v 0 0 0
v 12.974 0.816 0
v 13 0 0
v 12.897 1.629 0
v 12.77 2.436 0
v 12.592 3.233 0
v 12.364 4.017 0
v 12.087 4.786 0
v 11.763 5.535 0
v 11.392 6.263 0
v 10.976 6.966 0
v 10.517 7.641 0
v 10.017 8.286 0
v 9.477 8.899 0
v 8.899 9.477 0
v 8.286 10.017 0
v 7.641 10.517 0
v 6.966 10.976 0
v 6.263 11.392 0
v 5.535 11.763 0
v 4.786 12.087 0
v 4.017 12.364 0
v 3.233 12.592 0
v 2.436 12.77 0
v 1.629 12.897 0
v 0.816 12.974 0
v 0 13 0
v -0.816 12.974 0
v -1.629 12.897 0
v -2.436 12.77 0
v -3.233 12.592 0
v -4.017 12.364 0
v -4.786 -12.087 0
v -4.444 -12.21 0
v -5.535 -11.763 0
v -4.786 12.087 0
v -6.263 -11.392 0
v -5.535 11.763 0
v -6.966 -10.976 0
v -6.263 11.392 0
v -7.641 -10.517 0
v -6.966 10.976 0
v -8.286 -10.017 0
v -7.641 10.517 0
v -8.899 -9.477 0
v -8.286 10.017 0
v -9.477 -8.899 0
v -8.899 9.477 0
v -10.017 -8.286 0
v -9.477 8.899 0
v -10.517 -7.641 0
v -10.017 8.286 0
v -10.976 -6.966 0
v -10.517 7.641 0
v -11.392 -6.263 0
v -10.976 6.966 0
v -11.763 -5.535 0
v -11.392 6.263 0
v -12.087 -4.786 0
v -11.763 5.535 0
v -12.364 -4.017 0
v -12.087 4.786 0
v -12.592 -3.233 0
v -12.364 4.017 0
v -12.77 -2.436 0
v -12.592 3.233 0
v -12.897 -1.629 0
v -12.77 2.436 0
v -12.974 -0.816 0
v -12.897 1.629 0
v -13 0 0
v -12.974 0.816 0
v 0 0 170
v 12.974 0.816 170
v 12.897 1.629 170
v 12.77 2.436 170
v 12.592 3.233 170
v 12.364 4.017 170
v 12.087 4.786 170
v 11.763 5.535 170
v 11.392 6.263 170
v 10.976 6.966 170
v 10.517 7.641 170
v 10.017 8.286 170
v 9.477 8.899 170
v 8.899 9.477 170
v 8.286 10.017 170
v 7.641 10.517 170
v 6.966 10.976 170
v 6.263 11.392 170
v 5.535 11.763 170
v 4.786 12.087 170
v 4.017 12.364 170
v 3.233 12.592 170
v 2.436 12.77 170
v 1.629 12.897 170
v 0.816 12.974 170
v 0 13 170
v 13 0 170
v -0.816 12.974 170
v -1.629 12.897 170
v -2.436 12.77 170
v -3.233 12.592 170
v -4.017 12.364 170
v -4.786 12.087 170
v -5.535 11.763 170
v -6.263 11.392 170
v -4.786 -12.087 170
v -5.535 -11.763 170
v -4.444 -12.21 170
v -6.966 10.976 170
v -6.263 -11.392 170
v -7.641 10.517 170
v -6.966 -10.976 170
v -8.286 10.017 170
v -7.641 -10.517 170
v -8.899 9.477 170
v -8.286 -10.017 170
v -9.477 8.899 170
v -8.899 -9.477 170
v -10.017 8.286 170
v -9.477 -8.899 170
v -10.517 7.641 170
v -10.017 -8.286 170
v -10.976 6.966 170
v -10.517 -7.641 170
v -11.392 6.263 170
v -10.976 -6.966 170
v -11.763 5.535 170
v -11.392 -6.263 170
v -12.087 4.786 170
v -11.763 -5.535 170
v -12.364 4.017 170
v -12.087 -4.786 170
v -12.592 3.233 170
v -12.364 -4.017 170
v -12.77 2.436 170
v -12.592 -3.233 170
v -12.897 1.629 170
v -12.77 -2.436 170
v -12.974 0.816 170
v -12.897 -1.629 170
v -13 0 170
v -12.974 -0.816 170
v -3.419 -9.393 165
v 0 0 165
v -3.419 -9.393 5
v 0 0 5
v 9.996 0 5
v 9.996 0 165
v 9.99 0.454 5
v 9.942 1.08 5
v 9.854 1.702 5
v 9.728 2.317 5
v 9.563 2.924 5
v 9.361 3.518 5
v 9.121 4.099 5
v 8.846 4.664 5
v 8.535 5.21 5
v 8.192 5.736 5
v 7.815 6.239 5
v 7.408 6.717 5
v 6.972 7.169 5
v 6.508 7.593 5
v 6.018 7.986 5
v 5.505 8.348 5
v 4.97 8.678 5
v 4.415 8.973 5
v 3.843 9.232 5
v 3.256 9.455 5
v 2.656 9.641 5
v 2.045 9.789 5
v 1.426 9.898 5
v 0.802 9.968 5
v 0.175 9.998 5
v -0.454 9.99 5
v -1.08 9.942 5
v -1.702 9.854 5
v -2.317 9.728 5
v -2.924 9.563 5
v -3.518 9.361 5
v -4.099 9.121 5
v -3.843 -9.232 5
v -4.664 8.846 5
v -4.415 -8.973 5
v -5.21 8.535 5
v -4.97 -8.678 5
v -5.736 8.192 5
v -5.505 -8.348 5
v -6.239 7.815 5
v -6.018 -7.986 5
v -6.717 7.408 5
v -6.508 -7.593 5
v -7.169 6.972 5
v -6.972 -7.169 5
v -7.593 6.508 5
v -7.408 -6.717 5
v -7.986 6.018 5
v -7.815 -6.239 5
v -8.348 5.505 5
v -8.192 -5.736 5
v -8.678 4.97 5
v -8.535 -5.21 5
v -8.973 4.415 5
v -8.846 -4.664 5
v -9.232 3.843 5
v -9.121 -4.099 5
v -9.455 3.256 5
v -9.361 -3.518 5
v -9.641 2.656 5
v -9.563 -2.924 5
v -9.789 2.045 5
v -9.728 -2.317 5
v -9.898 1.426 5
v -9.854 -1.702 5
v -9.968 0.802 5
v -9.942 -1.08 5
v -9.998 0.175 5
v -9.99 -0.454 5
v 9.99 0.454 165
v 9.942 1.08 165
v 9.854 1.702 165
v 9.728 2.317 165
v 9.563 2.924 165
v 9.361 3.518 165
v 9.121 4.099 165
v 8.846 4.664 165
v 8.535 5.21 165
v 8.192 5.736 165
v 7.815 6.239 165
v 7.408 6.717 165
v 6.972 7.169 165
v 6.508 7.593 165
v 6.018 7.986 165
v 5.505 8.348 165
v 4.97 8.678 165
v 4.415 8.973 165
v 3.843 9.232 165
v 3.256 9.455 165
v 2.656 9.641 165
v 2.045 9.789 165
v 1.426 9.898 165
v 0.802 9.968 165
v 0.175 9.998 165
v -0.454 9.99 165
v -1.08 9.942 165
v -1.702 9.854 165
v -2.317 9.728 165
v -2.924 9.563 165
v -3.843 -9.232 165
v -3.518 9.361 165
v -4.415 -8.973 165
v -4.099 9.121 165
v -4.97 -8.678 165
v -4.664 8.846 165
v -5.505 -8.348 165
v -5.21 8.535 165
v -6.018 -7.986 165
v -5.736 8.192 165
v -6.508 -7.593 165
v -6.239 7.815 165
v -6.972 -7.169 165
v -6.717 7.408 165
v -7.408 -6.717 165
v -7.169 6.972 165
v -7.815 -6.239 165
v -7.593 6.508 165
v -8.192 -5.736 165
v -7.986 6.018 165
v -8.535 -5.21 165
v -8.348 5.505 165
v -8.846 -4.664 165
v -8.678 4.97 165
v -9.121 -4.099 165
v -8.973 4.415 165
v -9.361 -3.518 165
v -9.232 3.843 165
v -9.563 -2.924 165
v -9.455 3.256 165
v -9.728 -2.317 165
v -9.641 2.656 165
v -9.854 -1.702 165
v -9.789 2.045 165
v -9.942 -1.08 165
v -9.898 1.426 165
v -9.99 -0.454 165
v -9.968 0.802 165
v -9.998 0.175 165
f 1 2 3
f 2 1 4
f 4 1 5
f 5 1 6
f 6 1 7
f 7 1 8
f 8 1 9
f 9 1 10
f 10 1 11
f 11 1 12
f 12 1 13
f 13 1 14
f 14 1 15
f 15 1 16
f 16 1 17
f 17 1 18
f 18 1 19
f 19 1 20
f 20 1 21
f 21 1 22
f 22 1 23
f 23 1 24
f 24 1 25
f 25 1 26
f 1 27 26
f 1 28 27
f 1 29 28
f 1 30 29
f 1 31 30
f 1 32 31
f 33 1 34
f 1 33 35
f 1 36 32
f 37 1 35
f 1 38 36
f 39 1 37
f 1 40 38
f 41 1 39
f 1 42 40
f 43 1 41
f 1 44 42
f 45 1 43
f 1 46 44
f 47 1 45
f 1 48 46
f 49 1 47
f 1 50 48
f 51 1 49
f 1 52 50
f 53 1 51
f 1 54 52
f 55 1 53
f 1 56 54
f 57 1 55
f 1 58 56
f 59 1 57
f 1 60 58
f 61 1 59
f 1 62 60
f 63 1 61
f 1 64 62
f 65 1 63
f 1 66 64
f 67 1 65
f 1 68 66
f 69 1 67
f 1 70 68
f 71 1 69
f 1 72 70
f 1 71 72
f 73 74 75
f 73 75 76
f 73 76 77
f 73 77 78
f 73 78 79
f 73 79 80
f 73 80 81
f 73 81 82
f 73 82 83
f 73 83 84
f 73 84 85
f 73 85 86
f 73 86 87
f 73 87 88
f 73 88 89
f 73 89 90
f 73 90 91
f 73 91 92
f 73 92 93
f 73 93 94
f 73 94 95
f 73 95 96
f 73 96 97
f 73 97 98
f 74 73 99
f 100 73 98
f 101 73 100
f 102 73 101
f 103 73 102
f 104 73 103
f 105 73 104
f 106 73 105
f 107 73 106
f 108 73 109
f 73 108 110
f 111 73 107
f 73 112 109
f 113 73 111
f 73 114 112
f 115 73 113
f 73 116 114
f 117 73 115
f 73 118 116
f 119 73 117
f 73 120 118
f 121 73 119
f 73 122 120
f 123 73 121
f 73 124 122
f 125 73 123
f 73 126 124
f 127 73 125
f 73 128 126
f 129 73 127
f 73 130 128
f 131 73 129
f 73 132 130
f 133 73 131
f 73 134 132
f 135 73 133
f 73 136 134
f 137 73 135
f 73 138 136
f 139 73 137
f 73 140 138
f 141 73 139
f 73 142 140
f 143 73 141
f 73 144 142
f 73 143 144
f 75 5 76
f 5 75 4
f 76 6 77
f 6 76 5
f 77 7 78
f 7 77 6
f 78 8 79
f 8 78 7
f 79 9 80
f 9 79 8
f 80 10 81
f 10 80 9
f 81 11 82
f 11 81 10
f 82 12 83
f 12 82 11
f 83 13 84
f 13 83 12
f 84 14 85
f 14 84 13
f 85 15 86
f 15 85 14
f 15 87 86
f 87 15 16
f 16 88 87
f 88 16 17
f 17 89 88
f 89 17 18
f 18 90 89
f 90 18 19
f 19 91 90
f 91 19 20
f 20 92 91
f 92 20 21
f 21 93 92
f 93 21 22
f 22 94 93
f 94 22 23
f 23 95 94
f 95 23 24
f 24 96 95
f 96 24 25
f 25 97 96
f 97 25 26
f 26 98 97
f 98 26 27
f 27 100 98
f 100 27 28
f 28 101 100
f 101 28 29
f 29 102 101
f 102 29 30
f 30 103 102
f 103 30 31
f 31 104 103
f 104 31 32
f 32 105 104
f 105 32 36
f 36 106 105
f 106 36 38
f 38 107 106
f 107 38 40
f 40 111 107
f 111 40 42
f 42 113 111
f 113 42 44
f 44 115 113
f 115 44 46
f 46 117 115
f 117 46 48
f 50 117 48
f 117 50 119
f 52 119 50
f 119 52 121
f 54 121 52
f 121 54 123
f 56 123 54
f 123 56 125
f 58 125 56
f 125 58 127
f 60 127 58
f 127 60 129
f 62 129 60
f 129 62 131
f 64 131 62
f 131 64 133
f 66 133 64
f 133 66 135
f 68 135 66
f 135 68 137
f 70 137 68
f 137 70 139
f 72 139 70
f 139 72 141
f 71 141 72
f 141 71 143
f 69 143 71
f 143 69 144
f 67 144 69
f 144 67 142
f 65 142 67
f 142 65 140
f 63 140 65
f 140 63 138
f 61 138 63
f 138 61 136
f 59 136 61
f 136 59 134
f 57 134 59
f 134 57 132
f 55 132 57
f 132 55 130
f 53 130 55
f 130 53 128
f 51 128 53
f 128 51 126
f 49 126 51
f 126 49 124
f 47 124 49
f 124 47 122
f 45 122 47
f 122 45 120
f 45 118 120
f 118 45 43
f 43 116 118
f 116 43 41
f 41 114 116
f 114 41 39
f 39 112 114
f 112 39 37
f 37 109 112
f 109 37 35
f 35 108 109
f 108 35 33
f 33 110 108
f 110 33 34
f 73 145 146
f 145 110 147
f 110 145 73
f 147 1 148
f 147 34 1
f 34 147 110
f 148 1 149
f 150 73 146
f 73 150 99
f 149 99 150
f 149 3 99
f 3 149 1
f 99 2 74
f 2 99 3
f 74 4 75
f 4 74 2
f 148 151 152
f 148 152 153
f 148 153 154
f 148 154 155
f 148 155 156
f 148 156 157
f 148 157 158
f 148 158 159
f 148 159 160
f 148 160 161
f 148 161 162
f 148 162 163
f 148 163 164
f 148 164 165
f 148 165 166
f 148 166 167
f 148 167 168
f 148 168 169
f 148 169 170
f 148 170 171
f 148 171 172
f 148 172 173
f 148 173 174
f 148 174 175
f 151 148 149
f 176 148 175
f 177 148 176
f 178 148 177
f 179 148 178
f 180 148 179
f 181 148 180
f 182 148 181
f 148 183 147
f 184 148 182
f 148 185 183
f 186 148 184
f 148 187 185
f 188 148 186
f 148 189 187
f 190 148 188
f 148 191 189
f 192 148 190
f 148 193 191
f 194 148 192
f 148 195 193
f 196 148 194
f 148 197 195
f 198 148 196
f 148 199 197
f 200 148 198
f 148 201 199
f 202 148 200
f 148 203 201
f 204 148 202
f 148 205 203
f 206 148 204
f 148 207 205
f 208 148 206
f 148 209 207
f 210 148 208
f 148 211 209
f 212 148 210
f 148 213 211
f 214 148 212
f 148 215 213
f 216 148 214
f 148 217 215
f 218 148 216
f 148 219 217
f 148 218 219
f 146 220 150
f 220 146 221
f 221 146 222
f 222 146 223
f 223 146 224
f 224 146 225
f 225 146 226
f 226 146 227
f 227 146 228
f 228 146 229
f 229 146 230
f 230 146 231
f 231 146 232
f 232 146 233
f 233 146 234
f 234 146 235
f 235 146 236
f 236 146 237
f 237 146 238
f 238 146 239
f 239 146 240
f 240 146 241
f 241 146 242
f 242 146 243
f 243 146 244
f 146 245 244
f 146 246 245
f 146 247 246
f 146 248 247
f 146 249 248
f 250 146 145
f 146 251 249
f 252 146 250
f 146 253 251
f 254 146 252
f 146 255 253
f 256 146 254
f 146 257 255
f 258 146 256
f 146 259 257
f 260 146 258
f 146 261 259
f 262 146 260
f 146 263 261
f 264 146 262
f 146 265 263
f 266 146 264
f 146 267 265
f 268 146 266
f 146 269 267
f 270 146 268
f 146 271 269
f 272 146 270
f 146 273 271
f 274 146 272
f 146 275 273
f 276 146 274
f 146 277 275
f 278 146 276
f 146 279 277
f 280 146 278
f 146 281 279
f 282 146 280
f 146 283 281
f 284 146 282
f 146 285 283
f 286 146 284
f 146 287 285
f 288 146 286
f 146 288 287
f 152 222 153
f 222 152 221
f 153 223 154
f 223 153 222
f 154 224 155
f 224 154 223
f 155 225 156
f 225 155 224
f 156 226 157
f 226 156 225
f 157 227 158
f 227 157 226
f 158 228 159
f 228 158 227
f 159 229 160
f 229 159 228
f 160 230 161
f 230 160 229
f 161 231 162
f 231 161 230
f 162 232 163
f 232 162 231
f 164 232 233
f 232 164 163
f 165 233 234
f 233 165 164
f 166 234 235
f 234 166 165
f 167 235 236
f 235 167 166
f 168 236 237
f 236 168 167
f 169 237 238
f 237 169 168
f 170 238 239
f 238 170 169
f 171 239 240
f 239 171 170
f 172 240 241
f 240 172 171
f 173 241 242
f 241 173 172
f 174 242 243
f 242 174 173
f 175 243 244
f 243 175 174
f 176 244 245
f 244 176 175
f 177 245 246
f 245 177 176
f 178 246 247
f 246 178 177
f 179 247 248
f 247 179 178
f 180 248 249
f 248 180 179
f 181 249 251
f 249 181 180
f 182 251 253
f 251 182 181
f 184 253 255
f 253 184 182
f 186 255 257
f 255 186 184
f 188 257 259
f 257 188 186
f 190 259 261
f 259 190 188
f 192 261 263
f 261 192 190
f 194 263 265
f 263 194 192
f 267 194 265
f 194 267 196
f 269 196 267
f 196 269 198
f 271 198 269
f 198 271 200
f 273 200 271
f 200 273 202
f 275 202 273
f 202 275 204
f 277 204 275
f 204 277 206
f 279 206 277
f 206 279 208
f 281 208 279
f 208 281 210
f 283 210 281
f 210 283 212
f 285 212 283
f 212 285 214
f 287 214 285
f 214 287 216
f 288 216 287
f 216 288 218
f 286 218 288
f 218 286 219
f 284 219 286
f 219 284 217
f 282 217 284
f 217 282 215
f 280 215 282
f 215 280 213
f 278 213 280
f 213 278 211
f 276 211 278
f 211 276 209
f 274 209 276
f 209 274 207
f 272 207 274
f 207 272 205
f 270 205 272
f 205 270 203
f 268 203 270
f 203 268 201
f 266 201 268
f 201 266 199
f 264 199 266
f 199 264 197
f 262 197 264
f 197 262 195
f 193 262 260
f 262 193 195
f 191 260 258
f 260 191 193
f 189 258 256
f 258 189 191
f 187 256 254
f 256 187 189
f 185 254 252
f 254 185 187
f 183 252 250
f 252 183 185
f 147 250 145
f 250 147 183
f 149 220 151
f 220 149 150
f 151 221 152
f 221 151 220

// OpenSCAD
/**
 * pie.scad
 *
 * Use this module to generate a pie- or pizza- slice shape, which is particularly useful
 * in combination with `difference()` and `intersection()` to render shapes that extend a
 * certain number of degrees around or within a circle.
 *
 * This openSCAD library is part of the [dotscad](https://github.com/dotscad/dotscad)
 * project.
 *
 * @copyright  Chris Petersen, 2013
 * @license    http://creativecommons.org/licenses/LGPL/2.1/
 * @license    http://creativecommons.org/licenses/by-sa/3.0/
 *
 * @see        http://www.thingiverse.com/thing:109467
 * @source     https://github.com/dotscad/dotscad/blob/master/pie.scad
 *
 * @param float radius Radius of the pie
 * @param float angle  Angle (size) of the pie to slice
 * @param float height Height (thickness) of the pie
 * @param float spin   Angle to spin the slice on the Z axis
 */
module pie(radius, angle, height, spin=0) {
    // Negative angles shift direction of rotation
    clockwise = (angle < 0) ? true : false;
    // Support angles < 0 and > 360
    normalized_angle = abs((angle % 360 != 0) ? angle % 360 : angle % 360 + 360);
    // Select rotation direction
    rotation = clockwise ? [0, 180 - normalized_angle] : [180, normalized_angle];
    // Render
    if (angle != 0) {
        rotate([0,0,spin]) linear_extrude(height=height)
            difference() {
                circle(radius);
                if (normalized_angle < 180) {
                    union() for(a = rotation)
                        rotate(a) translate([-radius, 0, 0]) square(radius * 2);
                }
                else if (normalized_angle != 360) {
                    intersection_for(a = rotation)
                        rotate(a) translate([-radius, 0, 0]) square(radius * 2);
                }
            }
    }
}

/*
 * When this file is opened directly in OpenSCAD, the following code will render an
 * example of the functions it provides.  This example will *not* render if this module
 * is imported into your own project via the `use` statement.
 */
pie_example();
module pie_example($fn=100) {
    difference(){	
      pie(13,250,170); 
      translate([0,0,5]) pie(10,252,160,spin=-1);
    }
    
   
}
